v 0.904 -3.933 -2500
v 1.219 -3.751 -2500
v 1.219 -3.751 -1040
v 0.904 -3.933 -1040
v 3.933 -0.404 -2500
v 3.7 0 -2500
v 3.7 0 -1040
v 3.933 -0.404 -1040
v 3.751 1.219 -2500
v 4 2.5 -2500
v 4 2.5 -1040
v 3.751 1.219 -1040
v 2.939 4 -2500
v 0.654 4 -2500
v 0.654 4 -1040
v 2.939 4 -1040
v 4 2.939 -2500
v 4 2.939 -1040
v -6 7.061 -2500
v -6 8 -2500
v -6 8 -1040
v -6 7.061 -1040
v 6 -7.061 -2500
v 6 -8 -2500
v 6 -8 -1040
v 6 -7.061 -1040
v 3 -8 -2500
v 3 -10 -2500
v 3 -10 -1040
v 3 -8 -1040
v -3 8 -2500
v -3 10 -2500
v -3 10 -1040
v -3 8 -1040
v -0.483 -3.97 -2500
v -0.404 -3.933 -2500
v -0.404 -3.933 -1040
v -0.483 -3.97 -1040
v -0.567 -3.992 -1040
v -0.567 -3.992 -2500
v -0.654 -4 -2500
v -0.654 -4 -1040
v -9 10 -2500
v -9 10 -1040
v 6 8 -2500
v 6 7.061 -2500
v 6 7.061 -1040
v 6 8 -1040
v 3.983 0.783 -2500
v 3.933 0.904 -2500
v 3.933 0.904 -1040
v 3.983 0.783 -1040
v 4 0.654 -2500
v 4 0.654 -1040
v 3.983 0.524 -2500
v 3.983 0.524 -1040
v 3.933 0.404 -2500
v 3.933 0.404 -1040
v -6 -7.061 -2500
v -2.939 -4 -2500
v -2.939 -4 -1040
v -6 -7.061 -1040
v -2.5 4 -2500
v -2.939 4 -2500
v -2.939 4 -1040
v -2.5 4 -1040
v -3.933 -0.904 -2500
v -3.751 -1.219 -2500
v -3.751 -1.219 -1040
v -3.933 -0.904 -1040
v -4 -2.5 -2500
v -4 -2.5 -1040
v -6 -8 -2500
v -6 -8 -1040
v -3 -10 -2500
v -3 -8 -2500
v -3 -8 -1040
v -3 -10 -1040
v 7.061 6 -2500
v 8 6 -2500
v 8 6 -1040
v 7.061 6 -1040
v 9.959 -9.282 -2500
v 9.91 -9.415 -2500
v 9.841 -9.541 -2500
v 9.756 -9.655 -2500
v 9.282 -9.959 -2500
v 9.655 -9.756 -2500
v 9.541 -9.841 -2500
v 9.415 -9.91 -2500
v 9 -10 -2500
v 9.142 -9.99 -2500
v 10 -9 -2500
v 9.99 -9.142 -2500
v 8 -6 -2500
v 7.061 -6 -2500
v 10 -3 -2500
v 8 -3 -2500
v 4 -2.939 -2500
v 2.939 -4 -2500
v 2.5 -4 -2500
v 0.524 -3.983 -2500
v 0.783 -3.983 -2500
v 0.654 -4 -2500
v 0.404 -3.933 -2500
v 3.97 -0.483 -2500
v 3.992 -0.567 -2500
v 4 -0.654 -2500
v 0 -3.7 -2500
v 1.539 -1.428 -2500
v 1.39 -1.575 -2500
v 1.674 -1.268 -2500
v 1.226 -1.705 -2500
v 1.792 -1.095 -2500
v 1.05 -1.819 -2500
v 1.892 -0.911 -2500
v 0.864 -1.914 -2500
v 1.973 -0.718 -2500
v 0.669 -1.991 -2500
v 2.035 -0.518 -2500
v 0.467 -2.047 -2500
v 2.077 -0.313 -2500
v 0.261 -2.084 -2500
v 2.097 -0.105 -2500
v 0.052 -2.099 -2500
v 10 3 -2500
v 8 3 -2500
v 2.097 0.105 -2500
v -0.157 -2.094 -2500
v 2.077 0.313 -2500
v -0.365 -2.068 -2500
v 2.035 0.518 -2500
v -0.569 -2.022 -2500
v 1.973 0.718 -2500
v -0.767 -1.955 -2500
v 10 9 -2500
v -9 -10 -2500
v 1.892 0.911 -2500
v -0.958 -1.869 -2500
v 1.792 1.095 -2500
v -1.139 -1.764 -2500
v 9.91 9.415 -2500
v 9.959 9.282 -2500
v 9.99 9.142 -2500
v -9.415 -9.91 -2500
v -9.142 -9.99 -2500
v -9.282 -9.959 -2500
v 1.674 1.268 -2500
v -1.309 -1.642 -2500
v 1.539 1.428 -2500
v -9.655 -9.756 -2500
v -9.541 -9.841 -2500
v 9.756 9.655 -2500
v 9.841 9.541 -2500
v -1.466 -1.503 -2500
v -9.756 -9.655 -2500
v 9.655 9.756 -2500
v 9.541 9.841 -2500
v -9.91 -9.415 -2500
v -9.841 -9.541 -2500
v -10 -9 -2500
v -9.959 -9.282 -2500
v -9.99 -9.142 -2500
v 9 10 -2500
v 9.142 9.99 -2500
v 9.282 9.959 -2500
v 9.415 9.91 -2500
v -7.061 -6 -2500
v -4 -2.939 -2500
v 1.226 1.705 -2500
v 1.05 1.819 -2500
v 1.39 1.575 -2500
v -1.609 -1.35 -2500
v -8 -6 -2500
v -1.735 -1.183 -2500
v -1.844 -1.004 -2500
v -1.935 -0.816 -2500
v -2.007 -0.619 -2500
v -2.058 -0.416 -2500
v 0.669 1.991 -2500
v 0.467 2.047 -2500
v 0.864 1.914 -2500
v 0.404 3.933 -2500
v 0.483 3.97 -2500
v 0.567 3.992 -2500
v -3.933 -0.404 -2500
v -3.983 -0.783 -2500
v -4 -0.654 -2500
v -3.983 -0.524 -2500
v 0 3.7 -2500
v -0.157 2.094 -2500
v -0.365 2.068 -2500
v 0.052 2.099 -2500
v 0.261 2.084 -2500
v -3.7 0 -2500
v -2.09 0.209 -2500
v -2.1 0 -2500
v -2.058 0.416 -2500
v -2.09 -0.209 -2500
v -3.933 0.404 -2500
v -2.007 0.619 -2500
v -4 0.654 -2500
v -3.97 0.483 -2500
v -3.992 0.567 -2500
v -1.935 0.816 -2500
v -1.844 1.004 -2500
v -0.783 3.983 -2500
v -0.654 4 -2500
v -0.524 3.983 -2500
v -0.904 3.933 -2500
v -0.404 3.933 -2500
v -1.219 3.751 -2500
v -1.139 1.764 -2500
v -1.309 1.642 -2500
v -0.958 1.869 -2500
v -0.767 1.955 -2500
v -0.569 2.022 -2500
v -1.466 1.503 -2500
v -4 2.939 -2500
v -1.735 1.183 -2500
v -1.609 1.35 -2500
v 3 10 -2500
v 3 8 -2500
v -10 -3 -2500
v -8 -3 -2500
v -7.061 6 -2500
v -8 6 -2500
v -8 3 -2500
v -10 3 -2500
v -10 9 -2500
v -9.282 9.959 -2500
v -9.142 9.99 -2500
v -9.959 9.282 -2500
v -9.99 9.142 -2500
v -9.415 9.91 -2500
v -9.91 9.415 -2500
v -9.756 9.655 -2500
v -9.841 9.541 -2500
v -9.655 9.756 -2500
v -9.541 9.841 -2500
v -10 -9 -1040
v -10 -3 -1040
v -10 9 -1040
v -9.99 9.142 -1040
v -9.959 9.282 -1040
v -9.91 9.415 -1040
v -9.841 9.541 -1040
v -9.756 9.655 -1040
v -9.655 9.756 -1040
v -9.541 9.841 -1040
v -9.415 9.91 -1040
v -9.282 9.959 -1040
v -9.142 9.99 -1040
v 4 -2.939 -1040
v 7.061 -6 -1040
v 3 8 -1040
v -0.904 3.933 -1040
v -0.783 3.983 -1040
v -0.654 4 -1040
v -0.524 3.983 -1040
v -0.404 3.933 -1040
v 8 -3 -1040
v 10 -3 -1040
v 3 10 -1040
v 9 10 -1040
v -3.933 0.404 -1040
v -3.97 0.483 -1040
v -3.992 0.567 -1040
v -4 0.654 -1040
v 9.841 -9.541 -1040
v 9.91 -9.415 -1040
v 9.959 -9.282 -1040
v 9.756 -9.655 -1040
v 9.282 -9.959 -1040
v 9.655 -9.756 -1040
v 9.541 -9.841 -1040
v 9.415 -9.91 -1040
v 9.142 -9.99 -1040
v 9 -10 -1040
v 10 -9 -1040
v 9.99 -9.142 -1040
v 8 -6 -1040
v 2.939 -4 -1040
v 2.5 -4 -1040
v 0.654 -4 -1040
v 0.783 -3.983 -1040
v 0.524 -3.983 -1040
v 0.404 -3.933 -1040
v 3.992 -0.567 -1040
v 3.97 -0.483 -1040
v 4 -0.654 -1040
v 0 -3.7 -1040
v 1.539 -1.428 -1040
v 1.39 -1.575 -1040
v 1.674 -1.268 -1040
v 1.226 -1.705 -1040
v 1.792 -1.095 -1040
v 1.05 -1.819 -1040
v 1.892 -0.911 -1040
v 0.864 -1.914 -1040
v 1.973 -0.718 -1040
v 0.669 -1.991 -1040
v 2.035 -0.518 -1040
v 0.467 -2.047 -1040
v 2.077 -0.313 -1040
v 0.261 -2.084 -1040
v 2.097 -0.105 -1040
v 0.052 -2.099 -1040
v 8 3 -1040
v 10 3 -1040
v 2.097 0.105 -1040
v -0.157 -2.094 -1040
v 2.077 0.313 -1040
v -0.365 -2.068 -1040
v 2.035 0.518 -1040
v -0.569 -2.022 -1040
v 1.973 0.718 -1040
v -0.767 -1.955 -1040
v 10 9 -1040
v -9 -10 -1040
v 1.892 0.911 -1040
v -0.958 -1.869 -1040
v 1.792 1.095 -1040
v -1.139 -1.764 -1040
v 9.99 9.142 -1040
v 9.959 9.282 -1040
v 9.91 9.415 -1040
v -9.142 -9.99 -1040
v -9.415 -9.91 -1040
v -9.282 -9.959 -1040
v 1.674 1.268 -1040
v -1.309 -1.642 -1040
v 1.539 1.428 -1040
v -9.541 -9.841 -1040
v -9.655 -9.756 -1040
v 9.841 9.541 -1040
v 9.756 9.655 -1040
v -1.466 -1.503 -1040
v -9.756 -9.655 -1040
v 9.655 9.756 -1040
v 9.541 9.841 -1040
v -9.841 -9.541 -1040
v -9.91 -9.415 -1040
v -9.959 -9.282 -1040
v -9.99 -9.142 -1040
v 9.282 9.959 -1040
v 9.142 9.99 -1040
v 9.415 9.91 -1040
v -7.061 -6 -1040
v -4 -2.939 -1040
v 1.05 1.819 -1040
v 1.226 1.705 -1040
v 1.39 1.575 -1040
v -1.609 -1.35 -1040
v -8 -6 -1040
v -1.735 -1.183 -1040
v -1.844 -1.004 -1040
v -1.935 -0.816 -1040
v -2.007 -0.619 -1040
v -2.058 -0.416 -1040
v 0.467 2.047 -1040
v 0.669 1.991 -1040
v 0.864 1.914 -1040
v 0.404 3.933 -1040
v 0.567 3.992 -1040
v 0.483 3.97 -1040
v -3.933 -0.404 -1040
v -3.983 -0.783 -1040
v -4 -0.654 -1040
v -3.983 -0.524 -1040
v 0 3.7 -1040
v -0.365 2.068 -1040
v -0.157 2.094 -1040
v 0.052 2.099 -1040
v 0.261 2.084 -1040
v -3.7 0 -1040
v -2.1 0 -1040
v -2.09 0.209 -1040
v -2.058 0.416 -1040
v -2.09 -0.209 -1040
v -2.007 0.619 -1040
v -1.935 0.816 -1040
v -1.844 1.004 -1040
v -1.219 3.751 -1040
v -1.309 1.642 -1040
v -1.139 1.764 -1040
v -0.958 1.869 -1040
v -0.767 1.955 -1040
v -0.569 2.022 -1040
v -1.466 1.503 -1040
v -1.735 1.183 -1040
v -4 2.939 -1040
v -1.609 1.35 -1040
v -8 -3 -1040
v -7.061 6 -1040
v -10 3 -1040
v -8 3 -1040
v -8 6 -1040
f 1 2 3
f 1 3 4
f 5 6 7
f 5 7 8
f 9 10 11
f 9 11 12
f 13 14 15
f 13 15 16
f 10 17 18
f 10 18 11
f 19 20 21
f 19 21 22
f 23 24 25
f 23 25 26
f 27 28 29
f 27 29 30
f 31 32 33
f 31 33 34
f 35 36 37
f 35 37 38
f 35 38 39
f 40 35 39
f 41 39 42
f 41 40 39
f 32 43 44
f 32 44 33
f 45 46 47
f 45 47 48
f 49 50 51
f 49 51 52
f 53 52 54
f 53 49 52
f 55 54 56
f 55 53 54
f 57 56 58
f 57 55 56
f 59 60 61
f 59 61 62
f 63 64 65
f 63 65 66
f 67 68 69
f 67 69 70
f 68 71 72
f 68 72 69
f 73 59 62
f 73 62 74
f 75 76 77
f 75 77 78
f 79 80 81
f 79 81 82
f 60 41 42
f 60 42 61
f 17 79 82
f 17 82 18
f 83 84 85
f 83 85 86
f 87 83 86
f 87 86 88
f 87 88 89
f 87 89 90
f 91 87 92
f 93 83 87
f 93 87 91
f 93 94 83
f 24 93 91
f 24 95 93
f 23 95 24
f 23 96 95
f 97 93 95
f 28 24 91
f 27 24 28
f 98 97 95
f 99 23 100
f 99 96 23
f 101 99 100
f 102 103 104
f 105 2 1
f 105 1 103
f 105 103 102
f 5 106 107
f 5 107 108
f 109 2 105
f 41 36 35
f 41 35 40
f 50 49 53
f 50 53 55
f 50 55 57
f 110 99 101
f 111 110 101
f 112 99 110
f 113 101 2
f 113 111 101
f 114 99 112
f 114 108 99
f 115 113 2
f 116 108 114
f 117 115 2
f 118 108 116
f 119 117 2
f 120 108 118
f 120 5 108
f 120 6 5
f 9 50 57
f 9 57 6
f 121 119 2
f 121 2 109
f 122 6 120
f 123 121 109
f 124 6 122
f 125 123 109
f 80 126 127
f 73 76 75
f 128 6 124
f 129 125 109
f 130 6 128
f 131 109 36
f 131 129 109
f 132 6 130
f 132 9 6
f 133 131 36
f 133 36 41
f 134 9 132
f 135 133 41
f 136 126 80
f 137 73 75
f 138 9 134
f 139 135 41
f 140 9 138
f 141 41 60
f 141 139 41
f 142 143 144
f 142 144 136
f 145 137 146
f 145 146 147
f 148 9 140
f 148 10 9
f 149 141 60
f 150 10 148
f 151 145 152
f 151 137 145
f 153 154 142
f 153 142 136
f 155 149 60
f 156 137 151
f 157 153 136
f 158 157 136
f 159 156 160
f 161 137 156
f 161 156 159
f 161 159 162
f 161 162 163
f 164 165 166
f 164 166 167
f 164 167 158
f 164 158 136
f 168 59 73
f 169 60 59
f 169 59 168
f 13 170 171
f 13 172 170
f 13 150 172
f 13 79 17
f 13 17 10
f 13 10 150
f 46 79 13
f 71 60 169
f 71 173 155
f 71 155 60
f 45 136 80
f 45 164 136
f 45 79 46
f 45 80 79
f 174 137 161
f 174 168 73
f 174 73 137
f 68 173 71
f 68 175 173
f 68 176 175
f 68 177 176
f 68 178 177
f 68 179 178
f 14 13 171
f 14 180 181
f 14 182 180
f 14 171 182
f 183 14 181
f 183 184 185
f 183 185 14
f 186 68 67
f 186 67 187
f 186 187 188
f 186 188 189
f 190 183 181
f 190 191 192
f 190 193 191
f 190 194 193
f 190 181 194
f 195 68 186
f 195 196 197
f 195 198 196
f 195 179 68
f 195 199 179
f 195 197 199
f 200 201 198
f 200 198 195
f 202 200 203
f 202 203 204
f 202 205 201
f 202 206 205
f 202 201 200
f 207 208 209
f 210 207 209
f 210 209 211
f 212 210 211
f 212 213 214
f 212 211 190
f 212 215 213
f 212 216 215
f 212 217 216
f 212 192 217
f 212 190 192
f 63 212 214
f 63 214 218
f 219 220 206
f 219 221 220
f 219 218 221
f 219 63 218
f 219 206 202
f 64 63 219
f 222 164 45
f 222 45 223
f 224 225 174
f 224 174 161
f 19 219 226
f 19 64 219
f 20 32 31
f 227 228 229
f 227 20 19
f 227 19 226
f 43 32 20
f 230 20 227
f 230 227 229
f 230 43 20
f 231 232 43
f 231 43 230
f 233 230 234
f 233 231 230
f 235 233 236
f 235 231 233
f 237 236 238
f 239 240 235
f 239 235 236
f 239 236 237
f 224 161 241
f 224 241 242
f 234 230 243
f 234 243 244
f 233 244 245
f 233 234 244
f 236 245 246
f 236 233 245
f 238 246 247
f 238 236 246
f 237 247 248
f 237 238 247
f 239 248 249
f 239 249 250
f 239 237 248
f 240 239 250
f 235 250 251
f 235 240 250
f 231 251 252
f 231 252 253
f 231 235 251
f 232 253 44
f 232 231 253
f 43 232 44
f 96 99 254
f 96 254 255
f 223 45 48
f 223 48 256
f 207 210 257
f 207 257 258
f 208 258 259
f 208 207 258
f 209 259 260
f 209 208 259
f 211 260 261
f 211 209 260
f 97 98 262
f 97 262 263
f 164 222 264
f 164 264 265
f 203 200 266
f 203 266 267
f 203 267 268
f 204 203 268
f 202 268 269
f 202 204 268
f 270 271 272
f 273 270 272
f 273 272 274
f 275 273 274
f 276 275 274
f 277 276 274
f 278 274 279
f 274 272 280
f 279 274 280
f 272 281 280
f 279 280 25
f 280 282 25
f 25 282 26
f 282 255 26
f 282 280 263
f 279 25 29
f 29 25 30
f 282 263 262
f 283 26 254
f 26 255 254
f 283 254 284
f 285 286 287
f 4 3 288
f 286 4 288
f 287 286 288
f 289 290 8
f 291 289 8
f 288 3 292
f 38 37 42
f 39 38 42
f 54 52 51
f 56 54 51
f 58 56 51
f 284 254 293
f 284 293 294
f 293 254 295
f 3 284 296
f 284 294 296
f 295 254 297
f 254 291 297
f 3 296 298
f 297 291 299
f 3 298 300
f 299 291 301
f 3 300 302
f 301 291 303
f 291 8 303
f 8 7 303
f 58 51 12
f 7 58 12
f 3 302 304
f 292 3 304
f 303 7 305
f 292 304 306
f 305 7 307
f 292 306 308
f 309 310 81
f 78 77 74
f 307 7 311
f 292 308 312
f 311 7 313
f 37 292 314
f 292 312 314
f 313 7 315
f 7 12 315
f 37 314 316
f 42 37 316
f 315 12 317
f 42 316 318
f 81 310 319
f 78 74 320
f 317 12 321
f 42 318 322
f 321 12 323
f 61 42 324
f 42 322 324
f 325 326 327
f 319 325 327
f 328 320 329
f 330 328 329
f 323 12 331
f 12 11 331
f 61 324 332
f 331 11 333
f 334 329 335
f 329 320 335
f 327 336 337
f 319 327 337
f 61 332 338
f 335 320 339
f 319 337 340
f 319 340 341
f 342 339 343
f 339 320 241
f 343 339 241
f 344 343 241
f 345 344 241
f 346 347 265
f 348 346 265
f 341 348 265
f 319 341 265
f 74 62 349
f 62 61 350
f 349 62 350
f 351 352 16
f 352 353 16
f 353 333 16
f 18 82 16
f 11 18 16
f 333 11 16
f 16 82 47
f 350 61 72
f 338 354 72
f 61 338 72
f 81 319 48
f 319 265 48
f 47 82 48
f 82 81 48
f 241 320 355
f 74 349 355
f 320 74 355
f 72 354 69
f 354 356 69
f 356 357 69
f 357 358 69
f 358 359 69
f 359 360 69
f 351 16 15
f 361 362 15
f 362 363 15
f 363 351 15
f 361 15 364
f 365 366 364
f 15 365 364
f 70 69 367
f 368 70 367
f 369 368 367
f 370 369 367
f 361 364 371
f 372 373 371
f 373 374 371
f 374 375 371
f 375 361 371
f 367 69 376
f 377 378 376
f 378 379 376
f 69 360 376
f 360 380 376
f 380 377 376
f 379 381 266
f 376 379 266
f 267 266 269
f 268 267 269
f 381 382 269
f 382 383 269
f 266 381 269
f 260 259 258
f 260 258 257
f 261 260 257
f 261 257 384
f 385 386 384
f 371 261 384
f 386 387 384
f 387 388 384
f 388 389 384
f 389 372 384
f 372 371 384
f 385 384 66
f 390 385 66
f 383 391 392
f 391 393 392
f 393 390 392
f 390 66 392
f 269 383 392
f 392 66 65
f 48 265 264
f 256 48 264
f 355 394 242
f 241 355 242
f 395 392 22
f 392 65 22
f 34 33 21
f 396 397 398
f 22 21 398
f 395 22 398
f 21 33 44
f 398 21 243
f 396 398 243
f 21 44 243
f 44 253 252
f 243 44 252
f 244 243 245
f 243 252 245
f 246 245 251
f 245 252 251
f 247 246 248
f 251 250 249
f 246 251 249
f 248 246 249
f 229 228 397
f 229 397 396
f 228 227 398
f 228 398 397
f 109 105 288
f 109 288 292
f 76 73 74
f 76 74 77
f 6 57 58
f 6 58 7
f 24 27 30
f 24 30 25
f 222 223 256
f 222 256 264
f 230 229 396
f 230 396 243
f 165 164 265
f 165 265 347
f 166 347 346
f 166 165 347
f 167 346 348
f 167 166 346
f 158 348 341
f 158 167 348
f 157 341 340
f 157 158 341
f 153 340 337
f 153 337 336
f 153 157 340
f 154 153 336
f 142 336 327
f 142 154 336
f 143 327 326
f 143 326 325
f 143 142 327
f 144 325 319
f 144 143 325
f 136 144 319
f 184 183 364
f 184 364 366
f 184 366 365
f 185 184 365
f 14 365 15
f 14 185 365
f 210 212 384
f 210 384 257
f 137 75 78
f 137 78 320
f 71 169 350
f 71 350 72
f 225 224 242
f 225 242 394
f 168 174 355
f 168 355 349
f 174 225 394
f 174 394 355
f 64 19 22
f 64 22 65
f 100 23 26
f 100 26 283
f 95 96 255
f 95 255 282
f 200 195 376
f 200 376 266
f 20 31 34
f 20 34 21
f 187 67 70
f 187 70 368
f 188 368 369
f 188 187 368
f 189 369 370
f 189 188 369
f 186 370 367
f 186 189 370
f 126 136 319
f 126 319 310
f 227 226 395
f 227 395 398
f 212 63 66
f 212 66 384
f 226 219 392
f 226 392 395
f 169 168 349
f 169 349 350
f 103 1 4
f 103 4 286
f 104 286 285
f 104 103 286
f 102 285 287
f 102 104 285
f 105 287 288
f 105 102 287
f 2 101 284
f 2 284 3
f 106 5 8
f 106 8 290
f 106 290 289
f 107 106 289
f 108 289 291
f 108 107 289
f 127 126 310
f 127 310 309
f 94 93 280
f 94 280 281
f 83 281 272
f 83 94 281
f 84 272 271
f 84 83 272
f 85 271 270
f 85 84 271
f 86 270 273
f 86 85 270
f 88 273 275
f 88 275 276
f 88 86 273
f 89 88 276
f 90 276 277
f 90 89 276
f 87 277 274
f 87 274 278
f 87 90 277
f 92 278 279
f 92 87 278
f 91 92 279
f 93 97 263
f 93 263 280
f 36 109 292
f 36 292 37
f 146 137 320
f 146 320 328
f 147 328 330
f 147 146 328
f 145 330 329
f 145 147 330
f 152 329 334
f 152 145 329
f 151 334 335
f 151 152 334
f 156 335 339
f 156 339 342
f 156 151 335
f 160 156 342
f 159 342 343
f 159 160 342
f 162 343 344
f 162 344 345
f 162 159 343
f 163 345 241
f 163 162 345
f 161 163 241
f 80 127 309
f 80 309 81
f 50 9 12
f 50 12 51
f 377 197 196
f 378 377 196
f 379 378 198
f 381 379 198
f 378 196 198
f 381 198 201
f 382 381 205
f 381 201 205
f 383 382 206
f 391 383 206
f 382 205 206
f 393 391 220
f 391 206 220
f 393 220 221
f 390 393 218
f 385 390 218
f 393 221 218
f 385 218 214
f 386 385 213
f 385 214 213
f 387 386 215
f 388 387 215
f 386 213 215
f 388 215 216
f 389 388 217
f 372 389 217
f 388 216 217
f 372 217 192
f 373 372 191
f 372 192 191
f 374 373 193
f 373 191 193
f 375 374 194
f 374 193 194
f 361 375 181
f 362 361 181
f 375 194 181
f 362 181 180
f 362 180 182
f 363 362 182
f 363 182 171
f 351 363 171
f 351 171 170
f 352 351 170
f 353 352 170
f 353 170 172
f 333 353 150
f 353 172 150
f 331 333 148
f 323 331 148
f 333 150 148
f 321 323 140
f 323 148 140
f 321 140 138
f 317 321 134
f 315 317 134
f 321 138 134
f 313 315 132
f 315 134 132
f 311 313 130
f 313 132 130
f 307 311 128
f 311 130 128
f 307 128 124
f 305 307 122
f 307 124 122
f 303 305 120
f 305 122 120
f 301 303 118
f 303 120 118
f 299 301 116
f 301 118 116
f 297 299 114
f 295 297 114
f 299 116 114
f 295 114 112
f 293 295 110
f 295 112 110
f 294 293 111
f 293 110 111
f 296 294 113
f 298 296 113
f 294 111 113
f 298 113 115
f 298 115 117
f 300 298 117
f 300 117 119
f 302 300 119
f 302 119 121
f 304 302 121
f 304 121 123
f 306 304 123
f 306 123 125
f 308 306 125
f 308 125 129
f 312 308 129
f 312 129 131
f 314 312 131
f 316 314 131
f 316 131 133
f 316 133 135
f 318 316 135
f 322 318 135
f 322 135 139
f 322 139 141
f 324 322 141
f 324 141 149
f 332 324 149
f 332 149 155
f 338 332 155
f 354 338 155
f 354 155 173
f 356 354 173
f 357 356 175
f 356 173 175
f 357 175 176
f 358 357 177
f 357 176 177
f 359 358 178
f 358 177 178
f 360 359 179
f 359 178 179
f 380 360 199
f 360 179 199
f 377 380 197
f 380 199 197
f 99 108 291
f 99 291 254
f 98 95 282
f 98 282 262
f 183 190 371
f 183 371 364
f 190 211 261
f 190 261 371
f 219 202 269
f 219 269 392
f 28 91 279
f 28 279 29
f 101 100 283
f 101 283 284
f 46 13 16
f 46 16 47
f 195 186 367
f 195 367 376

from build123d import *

# Parameters (mm, degrees)
SKETCH_1_R      = 2.1
EXTRUDE_1_DEPTH = 1460


with BuildPart() as part:
    # 草圖1 → 填料-伸長1 (new body)
    with BuildSketch(Plane(origin=(0, 0, -2500), x_dir=(-1, 0, 0), z_dir=(0, 0, -1))):
        with BuildLine():
            Line((10, -3), (8, -3))
            Line((8, -3), (8, -6))
            Line((8, -6), (7.060660172, -6))
            Line((7.060660172, -6), (4, -2.939339828))
            Line((4, -2.939339828), (4, -2.5))
            Line((4, -2.5), (3.750976592, -1.218885629))
            Line((3.750976592, -1.218885629), (3.933012702, -0.903589838))
            ThreePointArc((3.933012702, -0.903589838), (4, -0.653589838), (3.933012702, -0.403589838))
            Line((3.933012702, -0.403589838), (3.7, 0))
            Line((3.7, 0), (3.933012702, 0.403589838))
            ThreePointArc((3.933012702, 0.403589838), (3.982962913, 0.524180316), (4, 0.653589838))
            Line((4, 0.653589838), (4, 2.939339828))
            Line((4, 2.939339828), (7.060660172, 6))
            Line((7.060660172, 6), (8, 6))
            Line((8, 6), (8, 3))
            Line((8, 3), (10, 3))
            Line((10, 3), (10, 9))
            ThreePointArc((10, 9), (9.707106781, 9.707106781), (9, 10))
            Line((9, 10), (3, 10))
            Line((3, 10), (3, 8))
            Line((3, 8), (6, 8))
            Line((6, 8), (6, 7.060660172))
            Line((6, 7.060660172), (2.939339828, 4))
            Line((2.939339828, 4), (2.5, 4))
            Line((2.5, 4), (1.218885629, 3.750976592))
            Line((1.218885629, 3.750976592), (0.903589838, 3.933012702))
            ThreePointArc((0.903589838, 3.933012702), (0.653589838, 4), (0.403589838, 3.933012702))
            Line((0.403589838, 3.933012702), (0, 3.7))
            Line((0, 3.7), (-0.403589838, 3.933012702))
            ThreePointArc((-0.403589838, 3.933012702), (-0.524180316, 3.982962913), (-0.653589838, 4))
            Line((-0.653589838, 4), (-2.939339828, 4))
            Line((-2.939339828, 4), (-6, 7.060660172))
            Line((-6, 7.060660172), (-6, 8))
            Line((-6, 8), (-3, 8))
            Line((-3, 8), (-3, 10))
            Line((-3, 10), (-9, 10))
            ThreePointArc((-9, 10), (-9.707106781, 9.707106781), (-10, 9))
            Line((-10, 9), (-10, 3))
            Line((-10, 3), (-8, 3))
            Line((-8, 3), (-8, 6))
            Line((-8, 6), (-7.060660172, 6))
            Line((-7.060660172, 6), (-4, 2.939339828))
            Line((-4, 2.939339828), (-4, 2.5))
            Line((-4, 2.5), (-3.750976592, 1.218885629))
            Line((-3.750976592, 1.218885629), (-3.933012702, 0.903589838))
            ThreePointArc((-3.933012702, 0.903589838), (-4, 0.653589838), (-3.933012702, 0.403589838))
            Line((-3.933012702, 0.403589838), (-3.7, 0))
            Line((-3.7, 0), (-3.933012702, -0.403589838))
            ThreePointArc((-3.933012702, -0.403589838), (-3.982962913, -0.524180316), (-4, -0.653589838))
            Line((-4, -0.653589838), (-4, -2.939339828))
            Line((-4, -2.939339828), (-7.060660172, -6))
            Line((-7.060660172, -6), (-8, -6))
            Line((-8, -6), (-8, -3))
            Line((-8, -3), (-10, -3))
            Line((-10, -3), (-10, -9))
            ThreePointArc((-10, -9), (-9.707106781, -9.707106781), (-9, -10))
            Line((-9, -10), (-3, -10))
            Line((-3, -10), (-3, -8))
            Line((-3, -8), (-6, -8))
            Line((-6, -8), (-6, -7.060660172))
            Line((-6, -7.060660172), (-2.939339828, -4))
            Line((-2.939339828, -4), (-2.5, -4))
            Line((-2.5, -4), (-1.218885629, -3.750976592))
            Line((-1.218885629, -3.750976592), (-0.903589838, -3.933012702))
            ThreePointArc((-0.903589838, -3.933012702), (-0.653589838, -4), (-0.403589838, -3.933012702))
            Line((-0.403589838, -3.933012702), (0, -3.7))
            Line((0, -3.7), (0.403589838, -3.933012702))
            ThreePointArc((0.403589838, -3.933012702), (0.524180316, -3.982962913), (0.653589838, -4))
            Line((0.653589838, -4), (2.939339828, -4))
            Line((2.939339828, -4), (6, -7.060660172))
            Line((6, -7.060660172), (6, -8))
            Line((6, -8), (3, -8))
            Line((3, -8), (3, -10))
            Line((3, -10), (9, -10))
            ThreePointArc((9, -10), (9.707106781, -9.707106781), (10, -9))
            Line((10, -9), (10, -3))
        make_face()
        Circle(SKETCH_1_R, mode=Mode.SUBTRACT)
    extrude(amount=-EXTRUDE_1_DEPTH)


solid = part.part
